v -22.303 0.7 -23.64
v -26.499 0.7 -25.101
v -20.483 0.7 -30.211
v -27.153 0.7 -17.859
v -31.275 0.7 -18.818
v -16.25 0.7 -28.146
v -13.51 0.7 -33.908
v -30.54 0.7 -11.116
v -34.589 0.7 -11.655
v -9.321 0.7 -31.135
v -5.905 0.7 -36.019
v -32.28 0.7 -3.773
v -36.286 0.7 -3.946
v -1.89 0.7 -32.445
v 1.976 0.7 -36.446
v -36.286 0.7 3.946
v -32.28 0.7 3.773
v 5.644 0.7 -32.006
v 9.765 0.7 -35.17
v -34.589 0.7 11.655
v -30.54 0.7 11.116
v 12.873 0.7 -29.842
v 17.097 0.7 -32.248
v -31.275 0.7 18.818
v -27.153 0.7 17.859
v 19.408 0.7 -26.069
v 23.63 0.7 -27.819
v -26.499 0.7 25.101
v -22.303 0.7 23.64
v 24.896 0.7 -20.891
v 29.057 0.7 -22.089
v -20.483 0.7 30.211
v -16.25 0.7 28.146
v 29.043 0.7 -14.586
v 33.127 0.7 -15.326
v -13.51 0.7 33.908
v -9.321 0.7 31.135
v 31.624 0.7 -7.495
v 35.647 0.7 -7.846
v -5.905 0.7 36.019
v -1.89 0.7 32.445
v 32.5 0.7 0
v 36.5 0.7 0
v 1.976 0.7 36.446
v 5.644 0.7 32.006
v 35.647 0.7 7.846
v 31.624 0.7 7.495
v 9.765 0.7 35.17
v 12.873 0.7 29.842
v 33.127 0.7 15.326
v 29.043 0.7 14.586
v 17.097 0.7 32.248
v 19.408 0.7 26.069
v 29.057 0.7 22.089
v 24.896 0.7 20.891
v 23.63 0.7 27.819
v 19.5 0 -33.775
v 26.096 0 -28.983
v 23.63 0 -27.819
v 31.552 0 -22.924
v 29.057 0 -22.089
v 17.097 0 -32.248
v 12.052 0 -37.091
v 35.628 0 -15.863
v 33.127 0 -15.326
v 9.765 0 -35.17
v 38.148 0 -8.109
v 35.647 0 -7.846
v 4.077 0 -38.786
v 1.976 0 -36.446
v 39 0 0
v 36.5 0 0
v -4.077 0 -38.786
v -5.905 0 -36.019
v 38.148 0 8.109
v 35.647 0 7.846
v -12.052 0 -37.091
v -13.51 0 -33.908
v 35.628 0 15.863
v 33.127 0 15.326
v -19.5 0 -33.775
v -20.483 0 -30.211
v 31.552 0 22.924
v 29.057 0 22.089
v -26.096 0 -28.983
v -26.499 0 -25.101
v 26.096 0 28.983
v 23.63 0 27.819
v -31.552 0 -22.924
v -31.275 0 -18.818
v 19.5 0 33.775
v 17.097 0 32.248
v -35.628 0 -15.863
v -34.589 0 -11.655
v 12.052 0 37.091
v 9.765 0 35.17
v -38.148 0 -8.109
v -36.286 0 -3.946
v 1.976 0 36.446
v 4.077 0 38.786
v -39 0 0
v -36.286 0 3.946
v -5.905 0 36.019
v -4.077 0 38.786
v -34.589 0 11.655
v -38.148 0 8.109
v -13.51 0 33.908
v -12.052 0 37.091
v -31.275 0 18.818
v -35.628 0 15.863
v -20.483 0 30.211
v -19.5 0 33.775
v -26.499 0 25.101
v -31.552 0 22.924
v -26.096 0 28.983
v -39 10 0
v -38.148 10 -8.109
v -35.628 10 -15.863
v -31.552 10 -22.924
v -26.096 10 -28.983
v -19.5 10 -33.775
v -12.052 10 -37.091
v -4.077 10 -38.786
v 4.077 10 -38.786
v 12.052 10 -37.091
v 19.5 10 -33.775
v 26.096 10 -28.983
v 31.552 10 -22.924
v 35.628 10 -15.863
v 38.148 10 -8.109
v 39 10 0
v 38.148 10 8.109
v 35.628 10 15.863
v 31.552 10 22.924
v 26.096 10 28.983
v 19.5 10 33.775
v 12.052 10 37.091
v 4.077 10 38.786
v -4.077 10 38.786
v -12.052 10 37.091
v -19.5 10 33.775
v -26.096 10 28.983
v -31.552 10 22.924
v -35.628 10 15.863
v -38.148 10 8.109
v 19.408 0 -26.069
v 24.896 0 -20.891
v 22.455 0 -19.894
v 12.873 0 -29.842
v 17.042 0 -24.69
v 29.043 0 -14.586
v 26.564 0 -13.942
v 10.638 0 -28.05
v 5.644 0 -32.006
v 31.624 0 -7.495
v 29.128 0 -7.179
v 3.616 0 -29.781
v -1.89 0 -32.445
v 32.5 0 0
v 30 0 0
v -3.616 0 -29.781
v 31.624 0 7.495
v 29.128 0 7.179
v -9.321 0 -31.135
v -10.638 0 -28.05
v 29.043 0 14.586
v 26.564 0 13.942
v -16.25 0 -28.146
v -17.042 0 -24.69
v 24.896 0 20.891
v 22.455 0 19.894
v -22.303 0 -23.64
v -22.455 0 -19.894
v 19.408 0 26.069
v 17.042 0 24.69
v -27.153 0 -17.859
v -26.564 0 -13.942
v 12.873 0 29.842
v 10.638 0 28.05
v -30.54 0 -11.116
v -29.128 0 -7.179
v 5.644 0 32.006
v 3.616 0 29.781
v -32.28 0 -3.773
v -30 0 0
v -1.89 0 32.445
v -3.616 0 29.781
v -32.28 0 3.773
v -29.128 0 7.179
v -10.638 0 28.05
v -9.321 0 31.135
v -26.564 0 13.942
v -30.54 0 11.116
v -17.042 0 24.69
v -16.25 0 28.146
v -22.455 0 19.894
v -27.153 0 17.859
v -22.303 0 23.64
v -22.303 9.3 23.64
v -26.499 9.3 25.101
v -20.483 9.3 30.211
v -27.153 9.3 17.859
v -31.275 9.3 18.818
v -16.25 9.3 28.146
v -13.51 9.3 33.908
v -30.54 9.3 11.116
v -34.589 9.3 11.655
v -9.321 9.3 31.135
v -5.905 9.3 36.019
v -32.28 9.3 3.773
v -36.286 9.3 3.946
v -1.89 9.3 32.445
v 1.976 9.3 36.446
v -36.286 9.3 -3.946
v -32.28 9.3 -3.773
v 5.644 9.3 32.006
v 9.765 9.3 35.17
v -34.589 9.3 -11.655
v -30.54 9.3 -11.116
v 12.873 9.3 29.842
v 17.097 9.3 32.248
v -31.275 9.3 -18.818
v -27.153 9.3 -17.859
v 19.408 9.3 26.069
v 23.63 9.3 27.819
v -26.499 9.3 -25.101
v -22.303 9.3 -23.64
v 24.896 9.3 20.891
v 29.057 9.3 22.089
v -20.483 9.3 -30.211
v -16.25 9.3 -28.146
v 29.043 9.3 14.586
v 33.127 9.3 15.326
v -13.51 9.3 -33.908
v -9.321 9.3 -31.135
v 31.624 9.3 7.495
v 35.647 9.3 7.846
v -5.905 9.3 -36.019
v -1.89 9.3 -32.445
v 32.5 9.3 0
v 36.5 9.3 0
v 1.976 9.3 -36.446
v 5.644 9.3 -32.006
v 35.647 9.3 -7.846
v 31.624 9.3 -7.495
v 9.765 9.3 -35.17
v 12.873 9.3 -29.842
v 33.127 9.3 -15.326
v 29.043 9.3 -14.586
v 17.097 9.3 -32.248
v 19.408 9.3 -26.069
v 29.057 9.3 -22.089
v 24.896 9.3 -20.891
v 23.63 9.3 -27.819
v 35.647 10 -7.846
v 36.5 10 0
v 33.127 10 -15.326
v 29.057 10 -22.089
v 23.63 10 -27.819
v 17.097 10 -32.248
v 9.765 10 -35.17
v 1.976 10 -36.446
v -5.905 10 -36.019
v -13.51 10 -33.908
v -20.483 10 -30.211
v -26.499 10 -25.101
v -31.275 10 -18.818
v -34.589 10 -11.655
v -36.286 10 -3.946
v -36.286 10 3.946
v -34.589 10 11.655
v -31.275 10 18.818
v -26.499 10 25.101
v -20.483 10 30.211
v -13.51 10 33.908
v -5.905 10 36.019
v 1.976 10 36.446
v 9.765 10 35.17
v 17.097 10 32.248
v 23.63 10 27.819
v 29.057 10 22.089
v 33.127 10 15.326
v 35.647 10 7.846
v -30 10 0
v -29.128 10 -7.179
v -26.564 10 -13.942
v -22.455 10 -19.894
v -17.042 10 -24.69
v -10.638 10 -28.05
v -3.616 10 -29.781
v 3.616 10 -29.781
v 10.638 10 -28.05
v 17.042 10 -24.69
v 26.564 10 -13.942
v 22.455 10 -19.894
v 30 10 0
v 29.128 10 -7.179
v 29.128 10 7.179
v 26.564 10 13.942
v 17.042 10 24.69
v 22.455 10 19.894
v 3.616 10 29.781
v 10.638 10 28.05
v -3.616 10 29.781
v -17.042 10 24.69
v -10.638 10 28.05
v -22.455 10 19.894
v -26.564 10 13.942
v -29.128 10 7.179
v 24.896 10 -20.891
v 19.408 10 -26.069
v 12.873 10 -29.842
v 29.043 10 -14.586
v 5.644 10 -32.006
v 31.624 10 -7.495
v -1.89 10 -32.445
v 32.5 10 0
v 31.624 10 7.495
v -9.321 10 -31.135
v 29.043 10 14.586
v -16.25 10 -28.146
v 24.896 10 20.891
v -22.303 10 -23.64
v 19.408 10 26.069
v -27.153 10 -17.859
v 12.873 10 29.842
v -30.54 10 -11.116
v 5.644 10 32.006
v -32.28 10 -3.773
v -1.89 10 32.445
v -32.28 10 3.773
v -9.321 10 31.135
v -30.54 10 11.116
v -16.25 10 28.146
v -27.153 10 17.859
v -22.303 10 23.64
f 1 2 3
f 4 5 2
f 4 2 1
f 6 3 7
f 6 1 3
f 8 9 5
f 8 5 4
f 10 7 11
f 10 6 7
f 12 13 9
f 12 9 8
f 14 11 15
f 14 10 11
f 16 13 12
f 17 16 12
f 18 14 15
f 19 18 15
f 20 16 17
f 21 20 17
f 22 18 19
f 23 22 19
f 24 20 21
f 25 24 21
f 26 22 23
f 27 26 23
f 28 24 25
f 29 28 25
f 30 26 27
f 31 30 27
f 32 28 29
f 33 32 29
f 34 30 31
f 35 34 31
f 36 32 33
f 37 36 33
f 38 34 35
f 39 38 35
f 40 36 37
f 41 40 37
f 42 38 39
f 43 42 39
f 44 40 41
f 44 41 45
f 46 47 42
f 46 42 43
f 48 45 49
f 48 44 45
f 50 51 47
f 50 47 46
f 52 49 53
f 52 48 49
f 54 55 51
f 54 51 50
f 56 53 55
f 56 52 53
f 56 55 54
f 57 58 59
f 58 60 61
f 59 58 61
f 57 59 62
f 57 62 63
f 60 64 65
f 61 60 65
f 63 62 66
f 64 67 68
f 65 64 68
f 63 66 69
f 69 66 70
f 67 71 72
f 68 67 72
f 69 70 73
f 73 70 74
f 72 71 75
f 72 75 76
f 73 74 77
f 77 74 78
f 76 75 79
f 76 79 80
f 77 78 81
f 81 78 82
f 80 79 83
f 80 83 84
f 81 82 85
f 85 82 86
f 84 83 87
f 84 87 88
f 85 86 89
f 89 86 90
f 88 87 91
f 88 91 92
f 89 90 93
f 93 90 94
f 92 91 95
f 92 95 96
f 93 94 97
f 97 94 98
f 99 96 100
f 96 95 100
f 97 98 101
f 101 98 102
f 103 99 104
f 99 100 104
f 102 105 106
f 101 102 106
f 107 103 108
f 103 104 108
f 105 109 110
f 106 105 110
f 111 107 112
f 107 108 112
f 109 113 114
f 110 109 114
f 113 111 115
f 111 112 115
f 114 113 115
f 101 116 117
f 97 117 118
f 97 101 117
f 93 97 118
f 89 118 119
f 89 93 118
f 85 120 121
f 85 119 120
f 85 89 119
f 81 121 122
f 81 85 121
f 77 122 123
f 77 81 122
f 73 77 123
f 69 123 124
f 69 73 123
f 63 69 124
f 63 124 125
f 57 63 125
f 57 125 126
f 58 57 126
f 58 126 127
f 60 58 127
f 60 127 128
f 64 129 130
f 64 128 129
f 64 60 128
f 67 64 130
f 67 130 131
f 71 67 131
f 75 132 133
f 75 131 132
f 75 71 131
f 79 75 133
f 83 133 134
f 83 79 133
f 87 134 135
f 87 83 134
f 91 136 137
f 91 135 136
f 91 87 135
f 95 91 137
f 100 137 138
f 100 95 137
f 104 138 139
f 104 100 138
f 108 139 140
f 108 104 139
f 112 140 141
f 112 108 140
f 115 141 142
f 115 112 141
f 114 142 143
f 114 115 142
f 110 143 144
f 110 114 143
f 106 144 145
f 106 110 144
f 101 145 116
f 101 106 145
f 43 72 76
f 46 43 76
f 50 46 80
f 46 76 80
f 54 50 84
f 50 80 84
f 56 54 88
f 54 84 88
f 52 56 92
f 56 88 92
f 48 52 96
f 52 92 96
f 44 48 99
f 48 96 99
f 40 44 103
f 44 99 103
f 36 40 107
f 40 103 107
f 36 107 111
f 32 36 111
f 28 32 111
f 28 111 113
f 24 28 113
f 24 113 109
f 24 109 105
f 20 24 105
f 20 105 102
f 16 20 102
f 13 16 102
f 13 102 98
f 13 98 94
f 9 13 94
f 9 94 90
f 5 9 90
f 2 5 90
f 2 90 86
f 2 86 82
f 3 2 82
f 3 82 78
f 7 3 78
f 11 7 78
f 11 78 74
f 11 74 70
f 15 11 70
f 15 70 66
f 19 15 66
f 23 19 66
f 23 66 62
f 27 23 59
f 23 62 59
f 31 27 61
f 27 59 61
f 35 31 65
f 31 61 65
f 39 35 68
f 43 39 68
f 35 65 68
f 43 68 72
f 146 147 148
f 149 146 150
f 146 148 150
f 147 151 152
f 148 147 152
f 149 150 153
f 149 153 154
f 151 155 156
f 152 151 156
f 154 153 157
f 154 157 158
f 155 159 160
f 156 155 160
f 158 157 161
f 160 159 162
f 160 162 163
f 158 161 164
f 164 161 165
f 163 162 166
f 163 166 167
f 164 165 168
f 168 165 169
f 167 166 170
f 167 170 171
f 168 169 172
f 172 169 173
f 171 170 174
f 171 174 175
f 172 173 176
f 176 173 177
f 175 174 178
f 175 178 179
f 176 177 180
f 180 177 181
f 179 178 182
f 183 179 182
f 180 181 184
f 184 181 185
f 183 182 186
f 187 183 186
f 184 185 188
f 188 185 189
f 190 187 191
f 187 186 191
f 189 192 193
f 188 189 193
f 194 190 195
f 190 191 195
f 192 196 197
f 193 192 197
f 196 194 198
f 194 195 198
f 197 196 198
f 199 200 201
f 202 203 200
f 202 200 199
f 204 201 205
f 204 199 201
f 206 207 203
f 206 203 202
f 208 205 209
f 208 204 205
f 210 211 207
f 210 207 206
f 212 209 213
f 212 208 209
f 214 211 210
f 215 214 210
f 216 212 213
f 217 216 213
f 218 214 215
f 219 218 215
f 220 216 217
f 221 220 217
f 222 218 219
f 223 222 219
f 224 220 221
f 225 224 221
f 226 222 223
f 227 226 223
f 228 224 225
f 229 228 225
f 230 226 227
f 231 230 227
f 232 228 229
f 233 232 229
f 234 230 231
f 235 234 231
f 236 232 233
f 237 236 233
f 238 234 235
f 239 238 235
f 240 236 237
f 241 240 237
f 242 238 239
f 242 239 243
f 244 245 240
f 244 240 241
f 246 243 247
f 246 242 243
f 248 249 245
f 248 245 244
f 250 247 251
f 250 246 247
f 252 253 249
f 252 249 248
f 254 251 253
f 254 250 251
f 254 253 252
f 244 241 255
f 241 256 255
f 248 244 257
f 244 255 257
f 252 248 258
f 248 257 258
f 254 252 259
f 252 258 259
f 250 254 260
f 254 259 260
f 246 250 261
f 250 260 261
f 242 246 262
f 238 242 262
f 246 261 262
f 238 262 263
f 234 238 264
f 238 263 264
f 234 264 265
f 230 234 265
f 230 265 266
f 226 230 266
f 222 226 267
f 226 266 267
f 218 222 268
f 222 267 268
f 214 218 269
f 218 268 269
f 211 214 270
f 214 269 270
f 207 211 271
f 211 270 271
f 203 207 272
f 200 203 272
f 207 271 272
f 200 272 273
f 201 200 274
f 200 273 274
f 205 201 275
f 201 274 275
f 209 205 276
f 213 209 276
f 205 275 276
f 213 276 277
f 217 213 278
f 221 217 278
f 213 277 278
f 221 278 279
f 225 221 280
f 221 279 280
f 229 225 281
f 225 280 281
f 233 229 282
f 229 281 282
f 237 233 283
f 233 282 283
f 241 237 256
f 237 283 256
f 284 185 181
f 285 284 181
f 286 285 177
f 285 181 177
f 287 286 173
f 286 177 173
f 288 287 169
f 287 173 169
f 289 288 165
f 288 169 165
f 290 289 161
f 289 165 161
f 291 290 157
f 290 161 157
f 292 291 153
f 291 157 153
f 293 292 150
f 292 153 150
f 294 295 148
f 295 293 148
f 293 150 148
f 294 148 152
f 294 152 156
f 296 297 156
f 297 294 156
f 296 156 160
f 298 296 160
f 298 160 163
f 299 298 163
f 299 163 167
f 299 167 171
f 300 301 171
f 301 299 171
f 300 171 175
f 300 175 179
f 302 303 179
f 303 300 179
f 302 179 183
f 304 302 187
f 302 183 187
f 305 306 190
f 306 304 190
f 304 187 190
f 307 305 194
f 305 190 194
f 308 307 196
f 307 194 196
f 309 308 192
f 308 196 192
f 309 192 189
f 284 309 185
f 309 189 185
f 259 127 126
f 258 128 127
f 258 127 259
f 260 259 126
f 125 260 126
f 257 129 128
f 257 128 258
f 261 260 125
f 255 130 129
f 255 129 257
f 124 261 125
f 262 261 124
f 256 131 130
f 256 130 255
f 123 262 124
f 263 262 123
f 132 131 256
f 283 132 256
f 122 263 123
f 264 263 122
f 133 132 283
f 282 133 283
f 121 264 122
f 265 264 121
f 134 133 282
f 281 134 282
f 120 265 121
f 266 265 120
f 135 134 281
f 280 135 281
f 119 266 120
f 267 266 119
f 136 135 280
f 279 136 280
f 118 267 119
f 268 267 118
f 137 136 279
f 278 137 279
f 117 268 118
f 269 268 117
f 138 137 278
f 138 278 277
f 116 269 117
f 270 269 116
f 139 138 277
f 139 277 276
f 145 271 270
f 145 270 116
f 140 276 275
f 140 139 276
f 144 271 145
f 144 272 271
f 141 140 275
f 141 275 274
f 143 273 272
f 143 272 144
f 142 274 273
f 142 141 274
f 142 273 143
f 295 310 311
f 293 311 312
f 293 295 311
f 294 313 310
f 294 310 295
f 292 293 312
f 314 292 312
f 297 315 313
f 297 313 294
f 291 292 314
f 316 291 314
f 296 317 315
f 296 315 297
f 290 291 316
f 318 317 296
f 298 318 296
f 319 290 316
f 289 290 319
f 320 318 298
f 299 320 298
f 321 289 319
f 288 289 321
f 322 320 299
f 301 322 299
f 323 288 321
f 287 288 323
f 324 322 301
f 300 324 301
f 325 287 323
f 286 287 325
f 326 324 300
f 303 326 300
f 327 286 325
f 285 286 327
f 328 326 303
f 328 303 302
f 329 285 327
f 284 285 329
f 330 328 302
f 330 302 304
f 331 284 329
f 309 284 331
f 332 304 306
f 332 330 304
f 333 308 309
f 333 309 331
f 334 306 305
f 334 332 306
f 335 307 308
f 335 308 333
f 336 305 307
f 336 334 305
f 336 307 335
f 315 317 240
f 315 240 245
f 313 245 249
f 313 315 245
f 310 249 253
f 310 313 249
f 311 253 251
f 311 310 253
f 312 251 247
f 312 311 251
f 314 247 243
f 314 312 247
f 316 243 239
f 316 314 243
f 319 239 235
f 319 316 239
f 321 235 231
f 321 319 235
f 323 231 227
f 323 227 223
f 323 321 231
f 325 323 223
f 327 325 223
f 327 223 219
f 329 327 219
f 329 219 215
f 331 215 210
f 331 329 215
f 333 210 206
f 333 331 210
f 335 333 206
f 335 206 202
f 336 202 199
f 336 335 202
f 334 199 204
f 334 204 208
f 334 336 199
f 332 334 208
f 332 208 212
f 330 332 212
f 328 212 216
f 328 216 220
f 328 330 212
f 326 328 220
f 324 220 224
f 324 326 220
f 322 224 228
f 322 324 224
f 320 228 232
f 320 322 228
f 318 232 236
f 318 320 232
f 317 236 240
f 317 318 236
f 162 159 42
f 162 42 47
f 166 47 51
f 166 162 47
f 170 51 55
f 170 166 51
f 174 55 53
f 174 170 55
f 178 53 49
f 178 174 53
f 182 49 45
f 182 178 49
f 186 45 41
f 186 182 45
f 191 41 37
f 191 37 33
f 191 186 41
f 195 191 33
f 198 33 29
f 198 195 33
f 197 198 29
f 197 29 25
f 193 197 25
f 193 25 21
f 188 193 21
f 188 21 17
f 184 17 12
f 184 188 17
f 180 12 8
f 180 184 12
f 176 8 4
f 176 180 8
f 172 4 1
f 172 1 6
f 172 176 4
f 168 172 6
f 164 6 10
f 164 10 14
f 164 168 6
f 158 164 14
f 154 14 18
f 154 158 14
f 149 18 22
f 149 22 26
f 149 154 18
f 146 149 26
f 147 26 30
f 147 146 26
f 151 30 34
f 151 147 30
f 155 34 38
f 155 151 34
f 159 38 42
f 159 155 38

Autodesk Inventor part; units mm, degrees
ref_plane "YZ Plane" through (0, 0, 0) normal (1, 0, 0) x (0, 1, 0)
ref_plane "XZ Plane" through (0, 0, 0) normal (0, 1, 0) x (-1, 0, 0)
ref_plane "XY Plane" through (0, 0, 0) normal (0, 0, 1) x (1, 0, 0)
sketch "Sketch1" plane through (0, 0, 0) normal (0, 1, 0) x (-1, 0, 0)
  circle A0 centre (0, 0) radius 30
  circle A1 centre (0, 0) radius 39
  dimension "d0" = 60
  dimension "d1" = 78
extrude "Extrusion1" add sketch "Sketch1" along normal blind 10
sketch "Sketch2" plane through (0, 10, 0) normal (0, 1, 0) x (1, 0, 0)
  circle A0 centre (0, 0) radius 32.5
  circle A1 centre (0, 0) radius 36.5
  dimension "d4" = 65
  dimension "d5" = 73
extrude "Extrusion2" cut sketch "Sketch2" against normal blind 0.7
sketch "Sketch3" plane through (0, 0, 0) normal (0, -1, 0) x (1, 0, 0)
  circle A0 centre (0, 0) radius 36.5 projected
  circle A1 centre (0, 0) radius 32.5 projected
extrude "Extrusion3" cut sketch "Sketch3" against normal blind 0.7
properties part number "bearing_.6812zzipt"
